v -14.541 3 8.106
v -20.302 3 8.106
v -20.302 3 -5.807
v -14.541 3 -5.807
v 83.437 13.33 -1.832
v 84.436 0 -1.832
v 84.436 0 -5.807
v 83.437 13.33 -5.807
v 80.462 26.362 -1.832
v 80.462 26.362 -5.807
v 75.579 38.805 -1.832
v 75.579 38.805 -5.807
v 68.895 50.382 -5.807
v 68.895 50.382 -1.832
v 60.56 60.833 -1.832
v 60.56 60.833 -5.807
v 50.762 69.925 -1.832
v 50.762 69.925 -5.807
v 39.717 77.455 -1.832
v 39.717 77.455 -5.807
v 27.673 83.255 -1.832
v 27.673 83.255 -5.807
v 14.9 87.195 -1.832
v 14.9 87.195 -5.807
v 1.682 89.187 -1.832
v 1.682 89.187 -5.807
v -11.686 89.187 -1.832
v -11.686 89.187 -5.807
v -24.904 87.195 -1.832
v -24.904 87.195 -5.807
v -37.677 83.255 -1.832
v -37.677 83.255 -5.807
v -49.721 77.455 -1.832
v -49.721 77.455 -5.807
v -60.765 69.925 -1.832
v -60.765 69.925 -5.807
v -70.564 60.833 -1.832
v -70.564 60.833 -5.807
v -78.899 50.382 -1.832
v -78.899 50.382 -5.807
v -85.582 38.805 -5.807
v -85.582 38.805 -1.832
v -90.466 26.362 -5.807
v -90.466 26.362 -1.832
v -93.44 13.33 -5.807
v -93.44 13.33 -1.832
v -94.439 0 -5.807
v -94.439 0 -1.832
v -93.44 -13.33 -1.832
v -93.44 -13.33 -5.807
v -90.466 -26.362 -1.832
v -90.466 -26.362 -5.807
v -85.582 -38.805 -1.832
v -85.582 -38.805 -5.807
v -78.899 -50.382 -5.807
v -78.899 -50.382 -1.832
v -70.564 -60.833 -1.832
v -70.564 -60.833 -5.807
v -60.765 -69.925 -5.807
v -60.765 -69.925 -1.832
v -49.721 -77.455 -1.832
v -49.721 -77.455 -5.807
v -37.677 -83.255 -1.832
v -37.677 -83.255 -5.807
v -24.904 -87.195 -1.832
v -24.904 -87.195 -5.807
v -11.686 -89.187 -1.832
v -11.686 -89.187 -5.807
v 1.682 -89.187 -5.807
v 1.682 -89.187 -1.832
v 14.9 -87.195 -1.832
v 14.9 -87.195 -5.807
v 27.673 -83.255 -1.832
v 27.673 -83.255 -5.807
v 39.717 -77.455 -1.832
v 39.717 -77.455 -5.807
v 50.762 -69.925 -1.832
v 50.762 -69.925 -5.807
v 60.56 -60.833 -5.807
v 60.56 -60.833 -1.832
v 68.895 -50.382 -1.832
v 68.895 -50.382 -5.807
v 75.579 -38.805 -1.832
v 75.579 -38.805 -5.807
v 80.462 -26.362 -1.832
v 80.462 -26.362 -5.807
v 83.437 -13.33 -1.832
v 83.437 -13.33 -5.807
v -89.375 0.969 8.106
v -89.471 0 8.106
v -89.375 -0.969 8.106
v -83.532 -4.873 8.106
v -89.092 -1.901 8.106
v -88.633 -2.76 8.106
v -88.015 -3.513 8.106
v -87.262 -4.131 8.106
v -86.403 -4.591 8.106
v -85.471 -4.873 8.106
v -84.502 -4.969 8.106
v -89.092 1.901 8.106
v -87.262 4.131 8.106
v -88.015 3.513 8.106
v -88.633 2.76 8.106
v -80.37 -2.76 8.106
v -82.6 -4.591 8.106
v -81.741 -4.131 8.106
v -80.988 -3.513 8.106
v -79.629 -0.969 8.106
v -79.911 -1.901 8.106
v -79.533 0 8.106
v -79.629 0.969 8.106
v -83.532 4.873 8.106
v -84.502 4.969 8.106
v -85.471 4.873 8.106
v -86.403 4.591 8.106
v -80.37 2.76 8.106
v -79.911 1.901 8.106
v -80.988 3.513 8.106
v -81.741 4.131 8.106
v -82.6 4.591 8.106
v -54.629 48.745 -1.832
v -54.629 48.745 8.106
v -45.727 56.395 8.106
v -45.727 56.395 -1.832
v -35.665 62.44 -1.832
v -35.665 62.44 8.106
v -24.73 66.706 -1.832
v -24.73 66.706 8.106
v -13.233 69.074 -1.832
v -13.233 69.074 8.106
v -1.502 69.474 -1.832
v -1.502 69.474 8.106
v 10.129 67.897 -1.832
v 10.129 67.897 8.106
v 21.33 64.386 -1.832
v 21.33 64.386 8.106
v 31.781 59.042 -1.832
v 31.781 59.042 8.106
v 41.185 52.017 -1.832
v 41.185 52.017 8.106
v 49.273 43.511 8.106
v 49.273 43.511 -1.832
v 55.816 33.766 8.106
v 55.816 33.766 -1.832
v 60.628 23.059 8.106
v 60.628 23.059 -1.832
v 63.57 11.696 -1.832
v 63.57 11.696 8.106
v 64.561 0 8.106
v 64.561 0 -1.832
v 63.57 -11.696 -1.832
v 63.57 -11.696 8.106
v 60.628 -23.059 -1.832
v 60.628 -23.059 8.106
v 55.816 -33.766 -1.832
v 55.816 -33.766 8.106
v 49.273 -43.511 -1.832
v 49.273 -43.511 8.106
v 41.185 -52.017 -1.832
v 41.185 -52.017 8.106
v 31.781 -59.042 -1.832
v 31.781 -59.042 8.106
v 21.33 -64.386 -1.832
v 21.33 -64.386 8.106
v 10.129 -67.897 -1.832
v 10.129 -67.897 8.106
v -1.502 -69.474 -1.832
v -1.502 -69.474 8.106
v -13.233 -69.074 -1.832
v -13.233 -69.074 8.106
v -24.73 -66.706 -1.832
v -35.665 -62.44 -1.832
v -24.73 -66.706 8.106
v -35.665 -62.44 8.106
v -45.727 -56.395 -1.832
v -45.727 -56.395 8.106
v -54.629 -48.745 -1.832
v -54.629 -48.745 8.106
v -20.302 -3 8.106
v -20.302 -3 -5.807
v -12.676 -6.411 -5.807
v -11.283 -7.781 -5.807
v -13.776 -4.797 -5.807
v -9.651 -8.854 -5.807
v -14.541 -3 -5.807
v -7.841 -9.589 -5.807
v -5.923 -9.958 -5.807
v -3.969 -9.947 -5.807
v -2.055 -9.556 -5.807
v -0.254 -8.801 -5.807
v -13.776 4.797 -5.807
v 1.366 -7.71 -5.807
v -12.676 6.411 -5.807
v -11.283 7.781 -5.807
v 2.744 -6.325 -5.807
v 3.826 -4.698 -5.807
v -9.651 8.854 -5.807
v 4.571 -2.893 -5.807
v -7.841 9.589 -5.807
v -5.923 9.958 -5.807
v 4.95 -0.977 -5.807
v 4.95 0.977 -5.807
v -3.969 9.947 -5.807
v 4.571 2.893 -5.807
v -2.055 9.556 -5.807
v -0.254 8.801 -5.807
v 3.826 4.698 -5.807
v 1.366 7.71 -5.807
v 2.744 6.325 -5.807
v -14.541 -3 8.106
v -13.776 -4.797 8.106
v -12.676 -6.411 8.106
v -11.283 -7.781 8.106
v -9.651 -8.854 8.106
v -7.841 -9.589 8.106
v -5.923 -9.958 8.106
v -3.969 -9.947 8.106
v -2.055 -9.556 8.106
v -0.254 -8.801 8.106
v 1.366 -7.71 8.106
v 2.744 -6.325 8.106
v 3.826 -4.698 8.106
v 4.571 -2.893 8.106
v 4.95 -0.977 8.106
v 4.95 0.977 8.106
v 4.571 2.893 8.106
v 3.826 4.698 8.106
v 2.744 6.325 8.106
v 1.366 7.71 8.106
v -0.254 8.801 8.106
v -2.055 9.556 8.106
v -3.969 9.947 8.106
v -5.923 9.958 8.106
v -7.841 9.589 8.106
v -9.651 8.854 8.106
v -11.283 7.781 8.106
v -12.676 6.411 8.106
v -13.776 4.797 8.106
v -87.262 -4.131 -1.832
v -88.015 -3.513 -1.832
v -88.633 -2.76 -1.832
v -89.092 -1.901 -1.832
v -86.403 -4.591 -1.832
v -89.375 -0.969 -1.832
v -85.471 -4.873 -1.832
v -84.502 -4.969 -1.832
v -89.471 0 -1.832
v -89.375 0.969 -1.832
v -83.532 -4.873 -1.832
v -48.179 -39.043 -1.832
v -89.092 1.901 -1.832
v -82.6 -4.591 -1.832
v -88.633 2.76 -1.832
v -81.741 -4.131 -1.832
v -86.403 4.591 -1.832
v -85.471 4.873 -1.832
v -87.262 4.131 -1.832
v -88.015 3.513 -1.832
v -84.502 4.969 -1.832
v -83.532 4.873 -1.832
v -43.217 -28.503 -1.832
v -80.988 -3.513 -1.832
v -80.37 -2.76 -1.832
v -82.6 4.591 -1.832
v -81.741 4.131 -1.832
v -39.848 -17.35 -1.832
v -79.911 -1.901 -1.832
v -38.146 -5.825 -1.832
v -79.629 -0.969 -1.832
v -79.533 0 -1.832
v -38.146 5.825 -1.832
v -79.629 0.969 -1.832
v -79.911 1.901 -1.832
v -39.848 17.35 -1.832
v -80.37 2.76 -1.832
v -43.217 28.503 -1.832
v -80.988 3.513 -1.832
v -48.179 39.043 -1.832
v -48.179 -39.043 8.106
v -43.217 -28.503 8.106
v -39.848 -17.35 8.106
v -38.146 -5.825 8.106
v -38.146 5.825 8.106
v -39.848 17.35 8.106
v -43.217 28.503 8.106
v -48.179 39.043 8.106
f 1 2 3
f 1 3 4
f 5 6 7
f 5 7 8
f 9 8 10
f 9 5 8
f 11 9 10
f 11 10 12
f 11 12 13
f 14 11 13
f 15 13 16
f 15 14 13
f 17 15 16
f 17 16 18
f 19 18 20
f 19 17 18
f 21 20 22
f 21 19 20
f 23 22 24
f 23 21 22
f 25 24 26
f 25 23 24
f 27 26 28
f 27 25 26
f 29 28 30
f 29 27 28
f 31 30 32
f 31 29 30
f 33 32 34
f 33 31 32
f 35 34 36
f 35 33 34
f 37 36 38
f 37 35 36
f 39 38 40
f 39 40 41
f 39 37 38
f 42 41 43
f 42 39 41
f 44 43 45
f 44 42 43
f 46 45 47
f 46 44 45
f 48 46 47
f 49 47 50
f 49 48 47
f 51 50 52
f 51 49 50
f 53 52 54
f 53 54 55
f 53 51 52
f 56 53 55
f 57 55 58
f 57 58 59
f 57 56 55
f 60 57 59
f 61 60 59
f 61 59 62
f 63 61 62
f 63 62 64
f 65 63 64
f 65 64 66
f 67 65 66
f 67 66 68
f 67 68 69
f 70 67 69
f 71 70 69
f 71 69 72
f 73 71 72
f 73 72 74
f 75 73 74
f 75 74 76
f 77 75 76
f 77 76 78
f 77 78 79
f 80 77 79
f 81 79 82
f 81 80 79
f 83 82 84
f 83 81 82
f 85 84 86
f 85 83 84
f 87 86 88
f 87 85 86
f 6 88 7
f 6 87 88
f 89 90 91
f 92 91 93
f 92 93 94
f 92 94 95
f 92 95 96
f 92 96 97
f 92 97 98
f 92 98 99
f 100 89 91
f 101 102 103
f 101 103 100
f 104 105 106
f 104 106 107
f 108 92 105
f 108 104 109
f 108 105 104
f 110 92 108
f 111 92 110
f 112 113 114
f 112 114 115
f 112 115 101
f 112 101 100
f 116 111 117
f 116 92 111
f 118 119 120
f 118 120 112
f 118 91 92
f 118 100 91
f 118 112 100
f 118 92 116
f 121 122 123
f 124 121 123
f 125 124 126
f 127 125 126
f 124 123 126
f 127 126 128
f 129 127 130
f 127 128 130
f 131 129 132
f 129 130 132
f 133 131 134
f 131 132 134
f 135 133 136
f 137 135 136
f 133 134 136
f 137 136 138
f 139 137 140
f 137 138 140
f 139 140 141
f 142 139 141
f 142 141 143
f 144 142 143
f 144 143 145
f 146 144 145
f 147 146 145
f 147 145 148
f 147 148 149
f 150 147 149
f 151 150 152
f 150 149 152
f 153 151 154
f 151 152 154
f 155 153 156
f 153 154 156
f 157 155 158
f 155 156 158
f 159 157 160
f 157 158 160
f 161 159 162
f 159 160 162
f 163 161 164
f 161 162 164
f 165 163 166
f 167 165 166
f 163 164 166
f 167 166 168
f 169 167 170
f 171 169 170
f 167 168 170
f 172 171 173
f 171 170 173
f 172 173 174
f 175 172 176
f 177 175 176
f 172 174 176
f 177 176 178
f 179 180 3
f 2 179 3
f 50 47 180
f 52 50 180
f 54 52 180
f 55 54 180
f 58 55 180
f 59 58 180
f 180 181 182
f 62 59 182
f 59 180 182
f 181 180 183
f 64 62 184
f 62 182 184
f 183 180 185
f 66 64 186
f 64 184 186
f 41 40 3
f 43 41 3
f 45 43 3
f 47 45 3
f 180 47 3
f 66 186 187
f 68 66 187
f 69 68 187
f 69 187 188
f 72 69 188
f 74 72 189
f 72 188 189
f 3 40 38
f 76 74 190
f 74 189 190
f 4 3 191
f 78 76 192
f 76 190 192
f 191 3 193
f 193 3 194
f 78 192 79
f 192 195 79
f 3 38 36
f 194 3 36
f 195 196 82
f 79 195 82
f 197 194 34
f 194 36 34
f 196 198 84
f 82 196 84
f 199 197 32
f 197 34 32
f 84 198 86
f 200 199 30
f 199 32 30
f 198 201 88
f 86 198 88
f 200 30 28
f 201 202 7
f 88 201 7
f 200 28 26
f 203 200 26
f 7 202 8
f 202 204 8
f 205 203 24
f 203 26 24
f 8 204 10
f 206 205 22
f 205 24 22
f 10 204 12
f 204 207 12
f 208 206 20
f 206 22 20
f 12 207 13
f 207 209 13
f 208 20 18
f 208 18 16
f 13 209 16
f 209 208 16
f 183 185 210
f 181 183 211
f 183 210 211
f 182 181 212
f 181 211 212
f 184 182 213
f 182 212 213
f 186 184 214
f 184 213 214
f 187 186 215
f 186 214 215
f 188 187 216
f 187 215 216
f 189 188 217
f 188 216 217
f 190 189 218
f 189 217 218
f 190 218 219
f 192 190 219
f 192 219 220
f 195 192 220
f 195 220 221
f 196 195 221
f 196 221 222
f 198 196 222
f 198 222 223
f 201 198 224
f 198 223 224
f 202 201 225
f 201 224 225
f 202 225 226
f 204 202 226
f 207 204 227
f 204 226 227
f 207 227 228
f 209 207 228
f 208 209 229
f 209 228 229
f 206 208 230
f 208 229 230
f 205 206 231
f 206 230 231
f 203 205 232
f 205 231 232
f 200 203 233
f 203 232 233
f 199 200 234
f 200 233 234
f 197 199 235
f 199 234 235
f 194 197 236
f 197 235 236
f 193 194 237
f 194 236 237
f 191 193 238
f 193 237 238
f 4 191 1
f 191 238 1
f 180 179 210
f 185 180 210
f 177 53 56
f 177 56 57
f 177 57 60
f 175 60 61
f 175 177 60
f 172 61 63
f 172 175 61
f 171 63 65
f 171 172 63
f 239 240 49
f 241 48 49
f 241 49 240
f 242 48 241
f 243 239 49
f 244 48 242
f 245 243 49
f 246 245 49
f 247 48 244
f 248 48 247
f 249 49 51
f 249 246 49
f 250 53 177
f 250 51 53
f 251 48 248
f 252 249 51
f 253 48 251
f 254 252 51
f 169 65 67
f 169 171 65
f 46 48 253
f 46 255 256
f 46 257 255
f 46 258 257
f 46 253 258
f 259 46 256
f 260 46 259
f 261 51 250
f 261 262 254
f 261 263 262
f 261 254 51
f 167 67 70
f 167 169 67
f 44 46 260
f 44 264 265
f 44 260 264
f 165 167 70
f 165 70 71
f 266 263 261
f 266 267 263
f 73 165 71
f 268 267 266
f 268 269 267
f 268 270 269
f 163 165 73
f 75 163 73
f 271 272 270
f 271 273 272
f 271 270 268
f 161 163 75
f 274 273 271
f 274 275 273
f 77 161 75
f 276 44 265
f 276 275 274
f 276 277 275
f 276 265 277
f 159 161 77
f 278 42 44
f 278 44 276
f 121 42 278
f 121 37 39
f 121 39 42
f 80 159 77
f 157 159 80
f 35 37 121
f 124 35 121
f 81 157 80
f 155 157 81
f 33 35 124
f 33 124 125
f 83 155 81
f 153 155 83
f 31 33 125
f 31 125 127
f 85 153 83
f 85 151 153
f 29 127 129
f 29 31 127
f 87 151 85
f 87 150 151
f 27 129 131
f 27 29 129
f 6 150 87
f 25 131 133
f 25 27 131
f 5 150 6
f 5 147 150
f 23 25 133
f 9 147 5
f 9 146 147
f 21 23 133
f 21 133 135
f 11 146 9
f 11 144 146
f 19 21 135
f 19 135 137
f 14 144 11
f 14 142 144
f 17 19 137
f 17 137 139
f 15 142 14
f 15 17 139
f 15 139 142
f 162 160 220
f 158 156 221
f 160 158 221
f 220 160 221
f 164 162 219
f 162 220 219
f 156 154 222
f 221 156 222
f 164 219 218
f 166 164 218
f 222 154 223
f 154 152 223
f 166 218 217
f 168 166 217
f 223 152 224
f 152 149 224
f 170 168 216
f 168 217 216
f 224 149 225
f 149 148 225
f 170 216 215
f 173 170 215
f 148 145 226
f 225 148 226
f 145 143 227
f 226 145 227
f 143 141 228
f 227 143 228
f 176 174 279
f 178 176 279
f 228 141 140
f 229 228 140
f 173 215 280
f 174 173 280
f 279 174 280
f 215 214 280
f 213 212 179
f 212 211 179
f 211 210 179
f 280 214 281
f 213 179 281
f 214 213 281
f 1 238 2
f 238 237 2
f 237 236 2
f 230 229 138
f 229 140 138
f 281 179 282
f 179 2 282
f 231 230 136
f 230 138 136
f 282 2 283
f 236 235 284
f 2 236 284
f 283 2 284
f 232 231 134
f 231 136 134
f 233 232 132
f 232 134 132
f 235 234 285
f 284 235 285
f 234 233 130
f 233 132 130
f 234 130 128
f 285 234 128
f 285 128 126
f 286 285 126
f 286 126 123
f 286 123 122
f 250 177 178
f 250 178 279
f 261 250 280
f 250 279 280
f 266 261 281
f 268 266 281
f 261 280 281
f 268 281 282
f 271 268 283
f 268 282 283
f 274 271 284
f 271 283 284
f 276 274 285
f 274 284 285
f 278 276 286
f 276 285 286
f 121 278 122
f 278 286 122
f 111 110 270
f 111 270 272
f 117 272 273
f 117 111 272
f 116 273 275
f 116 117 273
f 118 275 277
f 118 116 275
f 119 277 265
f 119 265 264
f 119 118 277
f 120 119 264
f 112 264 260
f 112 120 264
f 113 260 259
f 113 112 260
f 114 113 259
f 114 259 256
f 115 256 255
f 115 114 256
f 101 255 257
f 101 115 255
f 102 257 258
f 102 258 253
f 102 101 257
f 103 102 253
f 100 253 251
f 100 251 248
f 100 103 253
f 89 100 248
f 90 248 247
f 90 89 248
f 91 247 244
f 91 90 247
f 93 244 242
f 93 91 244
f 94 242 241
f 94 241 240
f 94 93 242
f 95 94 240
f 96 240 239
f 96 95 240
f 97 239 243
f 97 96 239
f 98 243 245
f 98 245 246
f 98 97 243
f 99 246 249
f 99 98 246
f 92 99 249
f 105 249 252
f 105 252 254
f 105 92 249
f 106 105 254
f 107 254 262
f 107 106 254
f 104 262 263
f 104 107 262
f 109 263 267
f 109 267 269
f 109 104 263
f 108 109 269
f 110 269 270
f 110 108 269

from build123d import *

# Parameters (mm, degrees)
SKETCH_1_R          = 3.5775
SKETCH_1_R_2        = 0.19875
EXTRUDE_2_DEPTH     = 0.159
EXTRUDE_START       = 0.3975
SKETCH_1_6_R        = 0.19875
EXTRUDE_3_DEPTH     = 0.3975
SCALE_2_SCALE       = 25
SKETCH_2_R          = 10
CUT_EXTRUDE_1_DEPTH = 23
SKETCH_3_W          = 10.6
SKETCH_3_H          = 6
CUT_EXTRUDE_2_DEPTH = 40


with BuildPart() as part:
    # 草图1 → 凸台-拉伸2 (new body)
    with BuildSketch(Plane.XY):
        Circle(SKETCH_1_R)
        Circle(SKETCH_1_R_2, mode=Mode.SUBTRACT)
    extrude(amount=-EXTRUDE_2_DEPTH)

    # 草图1<6> → 凸台-拉伸3 (add)
    # profile 1 of 2: a face of its own
    with BuildSketch(Plane.XY.offset(EXTRUDE_START)):
        with BuildLine():
            ThreePointArc((-1.985091803, 1.949799165), (-1.317199128, 0), (-1.985091803, -1.949799165))
            ThreePointArc((-1.985091803, -1.949799165), (2.7825, 0), (-1.985091803, 1.949799165))
        make_face()
        Circle(SKETCH_1_6_R, mode=Mode.SUBTRACT)
    # profile 2 of 2: a face of its own
    with BuildSketch(Plane.XY.offset(EXTRUDE_START)):
        with Locations((-3.18, 0)):
            Circle(SKETCH_1_6_R)
    extrude(amount=-EXTRUDE_3_DEPTH)


with BuildPart() as part_1:
    # 缩放比例2: scaled about (0.208410277, 0, 0.076319073)
    add(part.part.scale(SCALE_2_SCALE).moved(Location((-5.001846648, 0, -1.831657752))))

    # 草图2 → 切除-拉伸1 (cut)
    with BuildSketch(Plane.XY.offset(8.105842259)):
        with Locations((-5.001846653, 0)):
            Circle(SKETCH_2_R)
    extrude(amount=-CUT_EXTRUDE_1_DEPTH, mode=Mode.SUBTRACT)

    # 草图3 → 切除-拉伸2 (cut)
    with BuildSketch(Plane.XY.offset(8.105842259)):
        with Locations((-15.001846653, 0)):
            Rectangle(SKETCH_3_W, SKETCH_3_H)
    extrude(amount=-CUT_EXTRUDE_2_DEPTH, mode=Mode.SUBTRACT)


solid = part_1.part
